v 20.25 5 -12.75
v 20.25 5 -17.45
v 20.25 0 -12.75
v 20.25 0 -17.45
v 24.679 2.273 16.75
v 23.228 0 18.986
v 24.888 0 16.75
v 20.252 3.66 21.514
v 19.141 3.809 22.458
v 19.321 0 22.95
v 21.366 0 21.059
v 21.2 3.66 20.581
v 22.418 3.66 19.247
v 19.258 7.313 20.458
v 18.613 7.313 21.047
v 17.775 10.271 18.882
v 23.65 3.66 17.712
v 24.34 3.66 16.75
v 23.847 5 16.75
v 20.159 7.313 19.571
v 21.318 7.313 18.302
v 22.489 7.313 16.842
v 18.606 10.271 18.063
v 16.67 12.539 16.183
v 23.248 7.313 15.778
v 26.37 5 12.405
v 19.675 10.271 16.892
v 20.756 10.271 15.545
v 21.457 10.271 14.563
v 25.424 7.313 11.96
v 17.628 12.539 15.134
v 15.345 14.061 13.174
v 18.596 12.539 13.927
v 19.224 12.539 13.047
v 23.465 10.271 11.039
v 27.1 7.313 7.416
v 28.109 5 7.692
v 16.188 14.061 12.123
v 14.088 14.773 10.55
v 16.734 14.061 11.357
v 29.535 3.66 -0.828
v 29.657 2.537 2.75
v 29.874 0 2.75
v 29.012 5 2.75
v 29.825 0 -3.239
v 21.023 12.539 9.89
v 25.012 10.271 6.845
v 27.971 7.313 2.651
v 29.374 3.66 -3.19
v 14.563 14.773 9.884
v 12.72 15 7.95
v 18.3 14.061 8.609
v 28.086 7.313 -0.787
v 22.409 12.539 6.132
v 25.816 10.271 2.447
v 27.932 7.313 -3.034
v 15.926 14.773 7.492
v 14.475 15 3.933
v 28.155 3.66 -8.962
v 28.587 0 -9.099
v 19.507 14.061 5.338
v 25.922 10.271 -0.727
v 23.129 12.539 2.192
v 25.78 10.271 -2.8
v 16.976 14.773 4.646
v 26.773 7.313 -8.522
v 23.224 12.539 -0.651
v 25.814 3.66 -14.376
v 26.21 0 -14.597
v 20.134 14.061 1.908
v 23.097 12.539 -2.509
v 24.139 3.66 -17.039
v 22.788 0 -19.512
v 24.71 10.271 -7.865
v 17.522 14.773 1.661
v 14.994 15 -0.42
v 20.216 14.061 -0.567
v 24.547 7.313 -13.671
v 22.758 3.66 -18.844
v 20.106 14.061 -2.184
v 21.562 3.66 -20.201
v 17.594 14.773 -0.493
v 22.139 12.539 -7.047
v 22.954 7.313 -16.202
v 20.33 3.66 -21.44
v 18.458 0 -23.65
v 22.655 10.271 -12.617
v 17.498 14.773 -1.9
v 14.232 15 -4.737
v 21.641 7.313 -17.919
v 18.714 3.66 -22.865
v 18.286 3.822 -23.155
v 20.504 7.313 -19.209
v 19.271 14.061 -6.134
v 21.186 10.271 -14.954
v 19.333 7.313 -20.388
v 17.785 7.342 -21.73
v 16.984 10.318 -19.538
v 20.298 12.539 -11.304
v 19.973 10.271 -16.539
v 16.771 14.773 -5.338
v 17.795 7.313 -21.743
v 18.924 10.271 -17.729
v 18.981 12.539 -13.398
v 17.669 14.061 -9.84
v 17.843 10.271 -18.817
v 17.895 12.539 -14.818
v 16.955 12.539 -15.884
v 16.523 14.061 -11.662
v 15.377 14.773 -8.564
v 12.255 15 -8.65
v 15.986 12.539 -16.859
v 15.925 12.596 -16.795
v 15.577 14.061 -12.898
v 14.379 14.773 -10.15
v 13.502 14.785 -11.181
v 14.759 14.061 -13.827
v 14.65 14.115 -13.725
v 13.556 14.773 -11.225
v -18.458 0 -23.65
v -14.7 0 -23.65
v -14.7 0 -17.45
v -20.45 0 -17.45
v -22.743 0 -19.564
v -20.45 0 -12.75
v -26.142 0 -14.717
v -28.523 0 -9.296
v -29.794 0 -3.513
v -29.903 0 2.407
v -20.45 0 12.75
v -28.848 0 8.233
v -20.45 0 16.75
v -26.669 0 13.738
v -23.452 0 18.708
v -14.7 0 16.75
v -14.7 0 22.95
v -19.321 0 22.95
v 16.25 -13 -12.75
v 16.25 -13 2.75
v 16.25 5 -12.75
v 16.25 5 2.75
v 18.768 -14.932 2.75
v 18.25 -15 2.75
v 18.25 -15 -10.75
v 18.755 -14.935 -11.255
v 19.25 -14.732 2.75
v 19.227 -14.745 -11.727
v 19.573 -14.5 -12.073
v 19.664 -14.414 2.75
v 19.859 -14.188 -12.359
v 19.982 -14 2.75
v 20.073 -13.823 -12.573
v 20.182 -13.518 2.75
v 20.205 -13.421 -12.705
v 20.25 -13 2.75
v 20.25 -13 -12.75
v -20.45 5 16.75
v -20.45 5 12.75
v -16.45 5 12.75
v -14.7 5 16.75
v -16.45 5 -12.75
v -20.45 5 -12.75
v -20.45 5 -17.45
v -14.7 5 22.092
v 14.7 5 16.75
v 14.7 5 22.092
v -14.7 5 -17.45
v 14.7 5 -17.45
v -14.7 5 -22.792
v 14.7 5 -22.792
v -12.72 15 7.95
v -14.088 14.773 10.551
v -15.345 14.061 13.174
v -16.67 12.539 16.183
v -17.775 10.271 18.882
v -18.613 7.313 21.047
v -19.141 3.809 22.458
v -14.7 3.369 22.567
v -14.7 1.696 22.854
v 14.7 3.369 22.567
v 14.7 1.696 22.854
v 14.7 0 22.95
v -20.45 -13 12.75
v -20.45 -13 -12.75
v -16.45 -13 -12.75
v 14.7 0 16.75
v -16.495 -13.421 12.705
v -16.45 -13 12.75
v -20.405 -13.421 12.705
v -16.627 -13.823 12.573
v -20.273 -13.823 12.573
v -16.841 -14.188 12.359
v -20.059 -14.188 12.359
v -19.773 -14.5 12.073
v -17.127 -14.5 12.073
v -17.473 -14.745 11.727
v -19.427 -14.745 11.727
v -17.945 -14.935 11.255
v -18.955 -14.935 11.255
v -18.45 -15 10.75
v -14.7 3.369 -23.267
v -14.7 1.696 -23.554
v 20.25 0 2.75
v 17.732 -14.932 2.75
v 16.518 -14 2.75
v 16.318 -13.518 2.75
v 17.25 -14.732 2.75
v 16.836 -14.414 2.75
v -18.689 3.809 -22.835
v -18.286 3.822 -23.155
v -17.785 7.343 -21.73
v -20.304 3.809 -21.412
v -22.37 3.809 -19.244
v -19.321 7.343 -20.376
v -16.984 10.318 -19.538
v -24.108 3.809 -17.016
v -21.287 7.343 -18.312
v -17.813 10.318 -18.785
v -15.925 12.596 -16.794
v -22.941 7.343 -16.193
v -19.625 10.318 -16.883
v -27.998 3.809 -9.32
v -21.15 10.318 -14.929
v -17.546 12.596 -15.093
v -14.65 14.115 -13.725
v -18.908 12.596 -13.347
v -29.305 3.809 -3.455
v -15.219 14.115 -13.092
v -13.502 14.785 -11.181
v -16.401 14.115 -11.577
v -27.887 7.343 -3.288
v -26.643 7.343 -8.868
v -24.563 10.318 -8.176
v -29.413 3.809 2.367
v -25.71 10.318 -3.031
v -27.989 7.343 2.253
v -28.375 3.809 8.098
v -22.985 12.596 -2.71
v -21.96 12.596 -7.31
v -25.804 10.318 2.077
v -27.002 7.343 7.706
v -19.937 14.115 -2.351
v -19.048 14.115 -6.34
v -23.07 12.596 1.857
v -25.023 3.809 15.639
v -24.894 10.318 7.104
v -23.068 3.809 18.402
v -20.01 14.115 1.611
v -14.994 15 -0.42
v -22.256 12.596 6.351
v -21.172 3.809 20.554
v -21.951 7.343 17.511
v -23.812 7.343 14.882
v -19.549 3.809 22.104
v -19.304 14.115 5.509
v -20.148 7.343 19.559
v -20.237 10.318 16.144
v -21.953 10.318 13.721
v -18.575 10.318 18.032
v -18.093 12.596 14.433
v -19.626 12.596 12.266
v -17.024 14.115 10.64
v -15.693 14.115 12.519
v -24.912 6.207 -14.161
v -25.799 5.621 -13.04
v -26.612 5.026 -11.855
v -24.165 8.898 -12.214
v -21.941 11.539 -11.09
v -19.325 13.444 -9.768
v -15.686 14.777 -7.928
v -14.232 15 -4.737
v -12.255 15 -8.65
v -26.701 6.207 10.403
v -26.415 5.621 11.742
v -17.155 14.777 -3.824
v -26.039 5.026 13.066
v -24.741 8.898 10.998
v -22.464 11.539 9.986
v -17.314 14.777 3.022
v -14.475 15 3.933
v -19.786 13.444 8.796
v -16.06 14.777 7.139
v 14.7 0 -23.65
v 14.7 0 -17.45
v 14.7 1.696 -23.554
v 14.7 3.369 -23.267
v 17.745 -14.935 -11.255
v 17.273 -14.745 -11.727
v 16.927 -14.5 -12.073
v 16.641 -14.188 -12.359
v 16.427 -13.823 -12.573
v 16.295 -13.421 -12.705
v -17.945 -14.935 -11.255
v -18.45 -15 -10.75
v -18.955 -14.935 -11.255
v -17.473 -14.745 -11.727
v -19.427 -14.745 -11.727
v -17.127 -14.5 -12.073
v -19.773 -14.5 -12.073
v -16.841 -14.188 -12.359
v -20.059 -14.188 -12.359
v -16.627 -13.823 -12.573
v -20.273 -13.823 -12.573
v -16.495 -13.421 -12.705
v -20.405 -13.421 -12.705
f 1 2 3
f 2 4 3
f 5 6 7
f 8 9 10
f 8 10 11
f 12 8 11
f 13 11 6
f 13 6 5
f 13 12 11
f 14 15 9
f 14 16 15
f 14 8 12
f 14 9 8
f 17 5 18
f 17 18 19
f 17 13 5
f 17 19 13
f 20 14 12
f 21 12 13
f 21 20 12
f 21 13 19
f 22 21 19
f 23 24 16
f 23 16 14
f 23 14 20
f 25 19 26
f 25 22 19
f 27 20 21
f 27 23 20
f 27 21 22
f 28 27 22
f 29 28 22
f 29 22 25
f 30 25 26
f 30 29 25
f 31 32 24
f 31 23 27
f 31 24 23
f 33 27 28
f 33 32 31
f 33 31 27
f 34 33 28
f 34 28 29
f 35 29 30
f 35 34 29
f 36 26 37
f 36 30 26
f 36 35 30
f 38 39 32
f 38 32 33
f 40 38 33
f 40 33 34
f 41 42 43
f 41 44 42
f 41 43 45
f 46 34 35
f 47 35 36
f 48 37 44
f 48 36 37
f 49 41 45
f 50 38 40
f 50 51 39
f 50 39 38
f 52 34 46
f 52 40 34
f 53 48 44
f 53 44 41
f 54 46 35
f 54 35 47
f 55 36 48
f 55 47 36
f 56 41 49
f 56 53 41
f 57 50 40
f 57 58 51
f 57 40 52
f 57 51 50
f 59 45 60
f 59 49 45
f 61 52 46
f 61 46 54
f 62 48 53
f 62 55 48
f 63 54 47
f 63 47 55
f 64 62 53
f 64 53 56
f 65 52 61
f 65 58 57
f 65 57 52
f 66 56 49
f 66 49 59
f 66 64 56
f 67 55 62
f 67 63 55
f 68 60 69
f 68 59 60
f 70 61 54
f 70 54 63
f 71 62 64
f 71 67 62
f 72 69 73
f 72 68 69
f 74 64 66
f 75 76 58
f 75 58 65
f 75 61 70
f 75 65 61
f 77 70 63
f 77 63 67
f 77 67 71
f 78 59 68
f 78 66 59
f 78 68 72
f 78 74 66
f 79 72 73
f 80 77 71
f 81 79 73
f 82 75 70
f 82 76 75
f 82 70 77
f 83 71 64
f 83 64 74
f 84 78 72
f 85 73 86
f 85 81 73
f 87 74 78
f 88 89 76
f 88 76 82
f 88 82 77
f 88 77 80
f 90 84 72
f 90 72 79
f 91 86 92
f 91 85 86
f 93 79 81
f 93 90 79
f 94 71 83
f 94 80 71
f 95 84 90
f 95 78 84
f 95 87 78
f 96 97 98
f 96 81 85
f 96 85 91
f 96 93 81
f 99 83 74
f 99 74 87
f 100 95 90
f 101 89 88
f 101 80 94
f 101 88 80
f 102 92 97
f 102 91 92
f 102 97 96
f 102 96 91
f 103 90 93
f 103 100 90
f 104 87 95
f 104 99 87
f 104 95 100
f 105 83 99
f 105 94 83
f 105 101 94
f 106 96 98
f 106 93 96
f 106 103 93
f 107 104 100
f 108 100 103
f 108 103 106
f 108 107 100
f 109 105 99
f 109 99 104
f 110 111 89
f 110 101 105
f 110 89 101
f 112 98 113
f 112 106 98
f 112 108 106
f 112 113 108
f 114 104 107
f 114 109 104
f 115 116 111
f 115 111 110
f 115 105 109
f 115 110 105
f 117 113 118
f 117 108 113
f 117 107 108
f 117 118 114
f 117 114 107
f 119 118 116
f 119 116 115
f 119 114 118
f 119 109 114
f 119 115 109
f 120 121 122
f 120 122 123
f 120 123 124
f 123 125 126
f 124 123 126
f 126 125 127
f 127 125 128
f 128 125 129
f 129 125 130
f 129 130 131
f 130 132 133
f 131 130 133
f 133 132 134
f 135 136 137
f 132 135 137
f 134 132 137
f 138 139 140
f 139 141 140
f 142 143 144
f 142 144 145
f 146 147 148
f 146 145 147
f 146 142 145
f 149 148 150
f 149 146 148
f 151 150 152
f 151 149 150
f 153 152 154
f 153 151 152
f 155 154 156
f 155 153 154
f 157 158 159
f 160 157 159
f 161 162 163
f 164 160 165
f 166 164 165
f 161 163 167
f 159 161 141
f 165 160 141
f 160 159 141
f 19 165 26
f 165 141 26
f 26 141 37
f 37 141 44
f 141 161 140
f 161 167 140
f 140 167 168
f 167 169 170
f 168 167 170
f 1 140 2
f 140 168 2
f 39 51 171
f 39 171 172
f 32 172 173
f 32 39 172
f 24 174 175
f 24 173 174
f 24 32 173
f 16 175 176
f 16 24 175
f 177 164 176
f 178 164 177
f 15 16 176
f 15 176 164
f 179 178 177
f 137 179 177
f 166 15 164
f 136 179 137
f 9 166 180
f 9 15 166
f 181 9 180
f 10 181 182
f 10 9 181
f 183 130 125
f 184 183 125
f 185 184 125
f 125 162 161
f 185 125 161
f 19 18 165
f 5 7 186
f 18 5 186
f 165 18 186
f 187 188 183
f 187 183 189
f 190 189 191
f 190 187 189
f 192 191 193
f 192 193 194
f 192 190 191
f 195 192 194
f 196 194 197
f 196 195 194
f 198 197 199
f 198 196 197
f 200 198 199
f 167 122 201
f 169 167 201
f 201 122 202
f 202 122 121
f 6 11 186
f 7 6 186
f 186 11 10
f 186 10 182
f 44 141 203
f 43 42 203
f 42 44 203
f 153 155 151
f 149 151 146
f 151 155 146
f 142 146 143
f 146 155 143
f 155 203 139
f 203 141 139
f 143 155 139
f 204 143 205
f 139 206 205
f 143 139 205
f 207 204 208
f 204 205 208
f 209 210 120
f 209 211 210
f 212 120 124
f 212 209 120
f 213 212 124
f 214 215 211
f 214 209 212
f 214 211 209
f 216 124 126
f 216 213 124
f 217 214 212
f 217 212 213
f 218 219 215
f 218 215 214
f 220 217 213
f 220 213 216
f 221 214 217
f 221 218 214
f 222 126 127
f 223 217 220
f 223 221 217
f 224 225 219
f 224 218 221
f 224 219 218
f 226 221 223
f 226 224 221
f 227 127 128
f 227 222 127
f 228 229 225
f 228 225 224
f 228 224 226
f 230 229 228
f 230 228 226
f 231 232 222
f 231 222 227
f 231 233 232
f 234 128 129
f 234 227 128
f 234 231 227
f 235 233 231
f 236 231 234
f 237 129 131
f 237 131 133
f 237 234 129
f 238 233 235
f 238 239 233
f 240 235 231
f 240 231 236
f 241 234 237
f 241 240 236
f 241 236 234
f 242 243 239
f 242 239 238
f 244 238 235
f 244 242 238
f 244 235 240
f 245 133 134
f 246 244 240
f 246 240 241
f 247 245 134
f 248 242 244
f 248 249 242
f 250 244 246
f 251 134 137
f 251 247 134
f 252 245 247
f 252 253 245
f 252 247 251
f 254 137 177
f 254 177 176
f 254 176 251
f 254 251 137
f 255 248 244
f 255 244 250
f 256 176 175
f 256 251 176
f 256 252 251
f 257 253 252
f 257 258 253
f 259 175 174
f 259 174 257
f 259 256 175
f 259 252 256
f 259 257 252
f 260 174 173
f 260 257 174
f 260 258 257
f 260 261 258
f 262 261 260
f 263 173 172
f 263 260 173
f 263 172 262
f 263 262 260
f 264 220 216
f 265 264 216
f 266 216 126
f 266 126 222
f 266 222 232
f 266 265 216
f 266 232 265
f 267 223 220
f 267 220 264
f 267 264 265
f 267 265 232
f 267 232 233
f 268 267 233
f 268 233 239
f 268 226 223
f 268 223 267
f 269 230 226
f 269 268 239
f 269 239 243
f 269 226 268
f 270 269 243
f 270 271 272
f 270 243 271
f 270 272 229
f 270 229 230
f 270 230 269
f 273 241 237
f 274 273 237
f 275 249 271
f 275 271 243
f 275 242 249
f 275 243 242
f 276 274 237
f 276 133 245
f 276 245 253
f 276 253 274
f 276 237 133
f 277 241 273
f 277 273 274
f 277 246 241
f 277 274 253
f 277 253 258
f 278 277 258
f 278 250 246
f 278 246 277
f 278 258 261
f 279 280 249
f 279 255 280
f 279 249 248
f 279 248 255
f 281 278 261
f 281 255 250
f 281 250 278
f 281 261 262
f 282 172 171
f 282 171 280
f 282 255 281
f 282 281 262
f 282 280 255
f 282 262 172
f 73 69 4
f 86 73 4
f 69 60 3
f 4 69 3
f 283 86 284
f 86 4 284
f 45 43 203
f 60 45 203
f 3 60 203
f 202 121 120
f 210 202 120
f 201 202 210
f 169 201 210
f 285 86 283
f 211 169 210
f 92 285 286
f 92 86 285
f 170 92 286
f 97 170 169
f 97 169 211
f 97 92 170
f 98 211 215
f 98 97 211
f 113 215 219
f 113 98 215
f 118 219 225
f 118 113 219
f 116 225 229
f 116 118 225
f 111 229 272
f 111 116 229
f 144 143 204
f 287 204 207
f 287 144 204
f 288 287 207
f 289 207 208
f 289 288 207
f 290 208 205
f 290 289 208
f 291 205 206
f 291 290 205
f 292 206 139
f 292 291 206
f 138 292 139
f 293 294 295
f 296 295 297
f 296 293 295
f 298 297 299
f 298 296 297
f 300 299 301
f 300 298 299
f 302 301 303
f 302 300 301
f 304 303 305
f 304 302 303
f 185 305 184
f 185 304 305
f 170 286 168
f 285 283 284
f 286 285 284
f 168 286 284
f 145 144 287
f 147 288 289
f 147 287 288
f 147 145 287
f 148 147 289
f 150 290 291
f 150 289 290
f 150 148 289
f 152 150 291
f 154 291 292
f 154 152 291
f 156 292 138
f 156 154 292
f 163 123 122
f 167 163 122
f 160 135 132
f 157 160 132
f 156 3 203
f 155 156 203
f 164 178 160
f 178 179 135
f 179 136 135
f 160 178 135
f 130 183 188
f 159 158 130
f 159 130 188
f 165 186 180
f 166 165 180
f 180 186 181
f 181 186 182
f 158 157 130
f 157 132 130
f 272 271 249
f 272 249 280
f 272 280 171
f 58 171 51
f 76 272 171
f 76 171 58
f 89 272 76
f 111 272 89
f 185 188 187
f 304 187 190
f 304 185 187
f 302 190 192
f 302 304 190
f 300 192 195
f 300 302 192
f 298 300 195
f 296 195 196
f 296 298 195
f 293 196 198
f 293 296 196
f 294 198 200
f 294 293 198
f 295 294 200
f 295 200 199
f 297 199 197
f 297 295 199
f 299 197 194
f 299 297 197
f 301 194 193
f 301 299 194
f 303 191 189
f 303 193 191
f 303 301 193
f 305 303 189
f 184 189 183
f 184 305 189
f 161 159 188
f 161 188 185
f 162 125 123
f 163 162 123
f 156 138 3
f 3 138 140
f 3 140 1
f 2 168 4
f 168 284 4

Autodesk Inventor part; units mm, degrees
ref_plane "YZ Plane" through (0, 0, 0) normal (1, 0, 0) x (0, 1, 0)
ref_plane "XZ Plane" through (0, 0, 0) normal (0, 1, 0) x (-1, 0, 0)
ref_plane "XY Plane" through (0, 0, 0) normal (0, 0, 1) x (1, 0, 0)
sketch "스케치1" plane through (0, 0, 0) normal (0, 1, 0) x (-1, 0, 0)
  line L0 (14.7, -17.45) -> (14.7, -23.65)
  line L1 (-14.7, -23.65) -> (-14.7, -17.45)
  line L2 (-14.7, -17.45) -> (-20.25, -17.45)
  line L3 (-20.25, -17.45) -> (-20.25, 16.75)
  line L4 (-20.25, 16.75) -> (-14.7, 16.75)
  line L5 (-14.7, 16.75) -> (-14.7, 22.95)
  line L6 (14.7, 22.95) -> (14.7, 16.75)
  line L7 (14.7, 16.75) -> (20.45, 16.75)
  line L8 (20.45, 16.75) -> (20.45, -17.45)
  line L9 (20.45, -17.45) -> (14.7, -17.45)
  line L10 (-14.7, -23.65) -> (-18.4575, -23.65)
  line L11 (14.7, -23.65) -> (18.4575, -23.65)
  line L12 (14.7, 22.95) -> (19.3209, 22.95)
  line L13 (-14.7, 22.95) -> (-19.3209, 22.95)
  arc A0 (-19.3209, 22.95) -> (-18.4575, -23.65) centre (0, 0) ccw
  arc A1 (18.4575, -23.65) -> (19.3209, 22.95) centre (0, 0) ccw
  line L14 (-18.4575, -23.65) -> (-14.7, -23.65)
  line L15 (14.7, -23.65) -> (18.4575, -23.65)
  point P0 (-20, 0)
  point P1 (-30, 0)
  dimension "d12" = 40.7
  dimension "d13" = 34.2
extrude "돌출1" add sketch "스케치1" along normal blind 5
sketch "스케치2" plane through (0, 5, 0) normal (0, 1, 0) x (1, 0, 0)
  line L0 (-14.7, 23.65) -> (-18.4575, 23.65) projected
  arc A0 (-18.4575, 23.65) -> (-19.3209, -22.95) centre (0, 0) ccw projected
  line L1 (-19.3209, -22.95) -> (-14.7, -22.95) projected
  line L2 (-14.7, -22.95) -> (-14.7, -16.75) projected
  line L3 (-14.7, -16.75) -> (-20.45, -16.75) projected
  line L4 (-20.45, -16.75) -> (-20.45, 17.45) projected
  line L5 (-20.45, 17.45) -> (-14.7, 17.45) projected
  line L6 (-14.7, 17.45) -> (-14.7, 23.65) projected
  line L7 (18.4575, 23.65) -> (14.7, 23.65) projected
  line L8 (14.7, 23.65) -> (14.7, 17.45) projected
  line L9 (14.7, 17.45) -> (20.25, 17.45) projected
  line L10 (20.25, 17.45) -> (20.25, -16.75) projected
  line L11 (20.25, -16.75) -> (14.7, -16.75) projected
  line L12 (14.7, -16.75) -> (14.7, -22.95) projected
  line L13 (14.7, -22.95) -> (19.3209, -22.95) projected
  arc A1 (19.3209, -22.95) -> (18.4575, 23.65) centre (0, 0) ccw projected
  line L14 (14.7, -22.95) -> (-14.7, -22.95)
  line L15 (-14.7, 23.65) -> (14.7, 23.65)
extrude "돌출2" add sketch "스케치2" along normal blind 10
fillet "모깎기1" radius 15 4 edges at (-29.9949, 15, -0.5558) (29.9949, 15, -0.5558) (0, 15, 22.95) (0, 15, -23.65)
sketch "스케치3" plane through (0, 5, 0) normal (0, -1, 0) x (1, 0, 0)
  line L0 (-14.7, 22.0921) -> (14.7, 22.0921) projected
  line L1 (-14.7, 22.0921) -> (-14.7, 16.75) projected
  line L2 (-14.7, 16.75) -> (-20.45, 16.75) projected
  line L3 (-20.45, 16.75) -> (-20.45, -17.45) projected
  line L4 (-20.45, -17.45) -> (-14.7, -17.45) projected
  line L5 (-14.7, -17.45) -> (-14.7, -22.7921) projected
  line L6 (14.7, -22.7921) -> (-14.7, -22.7921) projected
  line L7 (14.7, -22.7921) -> (14.7, -17.45) projected
  line L8 (14.7, -17.45) -> (20.25, -17.45) projected
  line L9 (20.25, -17.45) -> (20.25, 16.75) projected
  line L10 (20.25, 16.75) -> (14.7, 16.75) projected
  line L11 (14.7, 16.75) -> (14.7, 22.0921) projected
  line L12 (20.25, 16.75) -> (-20.45, 16.75)
  line L13 (-20.45, 16.75) -> (-20.45, 12.75)
  line L14 (-20.45, 12.75) -> (20.25, 12.75)
  line L15 (20.25, 12.75) -> (20.25, 16.75)
  line L16 (20.25, -17.45) -> (-20.45, -17.45)
  line L17 (-20.45, -17.45) -> (-20.45, -12.75)
  line L18 (-20.45, -12.75) -> (20.25, -12.75)
  line L19 (20.25, -12.75) -> (20.25, -17.45)
  line L20 (20.25, 12.75) -> (16.25, 12.75)
  line L21 (16.25, 12.75) -> (16.25, -12.75)
  line L22 (16.25, -12.75) -> (20.25, -12.75)
  line L23 (20.25, -12.75) -> (20.25, 12.75)
  line L24 (-20.45, 12.75) -> (-16.45, 12.75)
  line L25 (-16.45, 12.75) -> (-16.45, -12.75)
  line L26 (-16.45, -12.75) -> (-20.45, -12.75)
  line L27 (-20.45, -12.75) -> (-20.45, 12.75)
  point P0 (0, 0)
  point P1 (-16.45, 12.75)
  point P2 (20.25, -12.75)
  point P3 (20.25, 12.75)
  dimension "d5" = 4
  dimension "d6" = 4.7
  dimension "d7" = 4
  dimension "d8" = 4
extrude "돌출3" add sketch "스케치3" along normal blind 20 contours L14 L25 L18 L3 | L9 L18 L21 L14
fillet "모깎기2" radius 2 8 edges at (16.25, -15, 0) (18.25, -15, 12.75) (20.25, -15, 0) (18.25, -15, -12.75) (-16.45, -15, 0) (-18.45, -15, 12.75) (-20.45, -15, 0) (-18.45, -15, -12.75)
sketch "스케치4" plane through (16.25, 5, -12.75) normal (-1, 0, 0) x (0, 0, 1)
  line L0 (0, -18) -> (25.5, -18) projected
  line L1 (0, -5) -> (0, -18) projected
  line L2 (0, -5) -> (25.5, -5) projected
  line L3 (25.5, -5) -> (25.5, -18) projected
  line L4 (29.5, -5) -> (29.5, 0) projected
  line L5 (29.5, 0) -> (15.5, 0)
  line L6 (15.5, 0) -> (15.5, -23.2577)
  line L7 (15.5, -23.2577) -> (29.5, -23.2577)
  line L8 (29.5, -23.2577) -> (29.5, 0)
  point P0 (12.75, -5)
  dimension "d14" = 14
extrude "돌출4" cut sketch "스케치4" against normal blind 20 contours L6 L2 L3 L0 | L0 L3 L2 L6 L5 L4 L8 L7
properties part number "arm cover1"
